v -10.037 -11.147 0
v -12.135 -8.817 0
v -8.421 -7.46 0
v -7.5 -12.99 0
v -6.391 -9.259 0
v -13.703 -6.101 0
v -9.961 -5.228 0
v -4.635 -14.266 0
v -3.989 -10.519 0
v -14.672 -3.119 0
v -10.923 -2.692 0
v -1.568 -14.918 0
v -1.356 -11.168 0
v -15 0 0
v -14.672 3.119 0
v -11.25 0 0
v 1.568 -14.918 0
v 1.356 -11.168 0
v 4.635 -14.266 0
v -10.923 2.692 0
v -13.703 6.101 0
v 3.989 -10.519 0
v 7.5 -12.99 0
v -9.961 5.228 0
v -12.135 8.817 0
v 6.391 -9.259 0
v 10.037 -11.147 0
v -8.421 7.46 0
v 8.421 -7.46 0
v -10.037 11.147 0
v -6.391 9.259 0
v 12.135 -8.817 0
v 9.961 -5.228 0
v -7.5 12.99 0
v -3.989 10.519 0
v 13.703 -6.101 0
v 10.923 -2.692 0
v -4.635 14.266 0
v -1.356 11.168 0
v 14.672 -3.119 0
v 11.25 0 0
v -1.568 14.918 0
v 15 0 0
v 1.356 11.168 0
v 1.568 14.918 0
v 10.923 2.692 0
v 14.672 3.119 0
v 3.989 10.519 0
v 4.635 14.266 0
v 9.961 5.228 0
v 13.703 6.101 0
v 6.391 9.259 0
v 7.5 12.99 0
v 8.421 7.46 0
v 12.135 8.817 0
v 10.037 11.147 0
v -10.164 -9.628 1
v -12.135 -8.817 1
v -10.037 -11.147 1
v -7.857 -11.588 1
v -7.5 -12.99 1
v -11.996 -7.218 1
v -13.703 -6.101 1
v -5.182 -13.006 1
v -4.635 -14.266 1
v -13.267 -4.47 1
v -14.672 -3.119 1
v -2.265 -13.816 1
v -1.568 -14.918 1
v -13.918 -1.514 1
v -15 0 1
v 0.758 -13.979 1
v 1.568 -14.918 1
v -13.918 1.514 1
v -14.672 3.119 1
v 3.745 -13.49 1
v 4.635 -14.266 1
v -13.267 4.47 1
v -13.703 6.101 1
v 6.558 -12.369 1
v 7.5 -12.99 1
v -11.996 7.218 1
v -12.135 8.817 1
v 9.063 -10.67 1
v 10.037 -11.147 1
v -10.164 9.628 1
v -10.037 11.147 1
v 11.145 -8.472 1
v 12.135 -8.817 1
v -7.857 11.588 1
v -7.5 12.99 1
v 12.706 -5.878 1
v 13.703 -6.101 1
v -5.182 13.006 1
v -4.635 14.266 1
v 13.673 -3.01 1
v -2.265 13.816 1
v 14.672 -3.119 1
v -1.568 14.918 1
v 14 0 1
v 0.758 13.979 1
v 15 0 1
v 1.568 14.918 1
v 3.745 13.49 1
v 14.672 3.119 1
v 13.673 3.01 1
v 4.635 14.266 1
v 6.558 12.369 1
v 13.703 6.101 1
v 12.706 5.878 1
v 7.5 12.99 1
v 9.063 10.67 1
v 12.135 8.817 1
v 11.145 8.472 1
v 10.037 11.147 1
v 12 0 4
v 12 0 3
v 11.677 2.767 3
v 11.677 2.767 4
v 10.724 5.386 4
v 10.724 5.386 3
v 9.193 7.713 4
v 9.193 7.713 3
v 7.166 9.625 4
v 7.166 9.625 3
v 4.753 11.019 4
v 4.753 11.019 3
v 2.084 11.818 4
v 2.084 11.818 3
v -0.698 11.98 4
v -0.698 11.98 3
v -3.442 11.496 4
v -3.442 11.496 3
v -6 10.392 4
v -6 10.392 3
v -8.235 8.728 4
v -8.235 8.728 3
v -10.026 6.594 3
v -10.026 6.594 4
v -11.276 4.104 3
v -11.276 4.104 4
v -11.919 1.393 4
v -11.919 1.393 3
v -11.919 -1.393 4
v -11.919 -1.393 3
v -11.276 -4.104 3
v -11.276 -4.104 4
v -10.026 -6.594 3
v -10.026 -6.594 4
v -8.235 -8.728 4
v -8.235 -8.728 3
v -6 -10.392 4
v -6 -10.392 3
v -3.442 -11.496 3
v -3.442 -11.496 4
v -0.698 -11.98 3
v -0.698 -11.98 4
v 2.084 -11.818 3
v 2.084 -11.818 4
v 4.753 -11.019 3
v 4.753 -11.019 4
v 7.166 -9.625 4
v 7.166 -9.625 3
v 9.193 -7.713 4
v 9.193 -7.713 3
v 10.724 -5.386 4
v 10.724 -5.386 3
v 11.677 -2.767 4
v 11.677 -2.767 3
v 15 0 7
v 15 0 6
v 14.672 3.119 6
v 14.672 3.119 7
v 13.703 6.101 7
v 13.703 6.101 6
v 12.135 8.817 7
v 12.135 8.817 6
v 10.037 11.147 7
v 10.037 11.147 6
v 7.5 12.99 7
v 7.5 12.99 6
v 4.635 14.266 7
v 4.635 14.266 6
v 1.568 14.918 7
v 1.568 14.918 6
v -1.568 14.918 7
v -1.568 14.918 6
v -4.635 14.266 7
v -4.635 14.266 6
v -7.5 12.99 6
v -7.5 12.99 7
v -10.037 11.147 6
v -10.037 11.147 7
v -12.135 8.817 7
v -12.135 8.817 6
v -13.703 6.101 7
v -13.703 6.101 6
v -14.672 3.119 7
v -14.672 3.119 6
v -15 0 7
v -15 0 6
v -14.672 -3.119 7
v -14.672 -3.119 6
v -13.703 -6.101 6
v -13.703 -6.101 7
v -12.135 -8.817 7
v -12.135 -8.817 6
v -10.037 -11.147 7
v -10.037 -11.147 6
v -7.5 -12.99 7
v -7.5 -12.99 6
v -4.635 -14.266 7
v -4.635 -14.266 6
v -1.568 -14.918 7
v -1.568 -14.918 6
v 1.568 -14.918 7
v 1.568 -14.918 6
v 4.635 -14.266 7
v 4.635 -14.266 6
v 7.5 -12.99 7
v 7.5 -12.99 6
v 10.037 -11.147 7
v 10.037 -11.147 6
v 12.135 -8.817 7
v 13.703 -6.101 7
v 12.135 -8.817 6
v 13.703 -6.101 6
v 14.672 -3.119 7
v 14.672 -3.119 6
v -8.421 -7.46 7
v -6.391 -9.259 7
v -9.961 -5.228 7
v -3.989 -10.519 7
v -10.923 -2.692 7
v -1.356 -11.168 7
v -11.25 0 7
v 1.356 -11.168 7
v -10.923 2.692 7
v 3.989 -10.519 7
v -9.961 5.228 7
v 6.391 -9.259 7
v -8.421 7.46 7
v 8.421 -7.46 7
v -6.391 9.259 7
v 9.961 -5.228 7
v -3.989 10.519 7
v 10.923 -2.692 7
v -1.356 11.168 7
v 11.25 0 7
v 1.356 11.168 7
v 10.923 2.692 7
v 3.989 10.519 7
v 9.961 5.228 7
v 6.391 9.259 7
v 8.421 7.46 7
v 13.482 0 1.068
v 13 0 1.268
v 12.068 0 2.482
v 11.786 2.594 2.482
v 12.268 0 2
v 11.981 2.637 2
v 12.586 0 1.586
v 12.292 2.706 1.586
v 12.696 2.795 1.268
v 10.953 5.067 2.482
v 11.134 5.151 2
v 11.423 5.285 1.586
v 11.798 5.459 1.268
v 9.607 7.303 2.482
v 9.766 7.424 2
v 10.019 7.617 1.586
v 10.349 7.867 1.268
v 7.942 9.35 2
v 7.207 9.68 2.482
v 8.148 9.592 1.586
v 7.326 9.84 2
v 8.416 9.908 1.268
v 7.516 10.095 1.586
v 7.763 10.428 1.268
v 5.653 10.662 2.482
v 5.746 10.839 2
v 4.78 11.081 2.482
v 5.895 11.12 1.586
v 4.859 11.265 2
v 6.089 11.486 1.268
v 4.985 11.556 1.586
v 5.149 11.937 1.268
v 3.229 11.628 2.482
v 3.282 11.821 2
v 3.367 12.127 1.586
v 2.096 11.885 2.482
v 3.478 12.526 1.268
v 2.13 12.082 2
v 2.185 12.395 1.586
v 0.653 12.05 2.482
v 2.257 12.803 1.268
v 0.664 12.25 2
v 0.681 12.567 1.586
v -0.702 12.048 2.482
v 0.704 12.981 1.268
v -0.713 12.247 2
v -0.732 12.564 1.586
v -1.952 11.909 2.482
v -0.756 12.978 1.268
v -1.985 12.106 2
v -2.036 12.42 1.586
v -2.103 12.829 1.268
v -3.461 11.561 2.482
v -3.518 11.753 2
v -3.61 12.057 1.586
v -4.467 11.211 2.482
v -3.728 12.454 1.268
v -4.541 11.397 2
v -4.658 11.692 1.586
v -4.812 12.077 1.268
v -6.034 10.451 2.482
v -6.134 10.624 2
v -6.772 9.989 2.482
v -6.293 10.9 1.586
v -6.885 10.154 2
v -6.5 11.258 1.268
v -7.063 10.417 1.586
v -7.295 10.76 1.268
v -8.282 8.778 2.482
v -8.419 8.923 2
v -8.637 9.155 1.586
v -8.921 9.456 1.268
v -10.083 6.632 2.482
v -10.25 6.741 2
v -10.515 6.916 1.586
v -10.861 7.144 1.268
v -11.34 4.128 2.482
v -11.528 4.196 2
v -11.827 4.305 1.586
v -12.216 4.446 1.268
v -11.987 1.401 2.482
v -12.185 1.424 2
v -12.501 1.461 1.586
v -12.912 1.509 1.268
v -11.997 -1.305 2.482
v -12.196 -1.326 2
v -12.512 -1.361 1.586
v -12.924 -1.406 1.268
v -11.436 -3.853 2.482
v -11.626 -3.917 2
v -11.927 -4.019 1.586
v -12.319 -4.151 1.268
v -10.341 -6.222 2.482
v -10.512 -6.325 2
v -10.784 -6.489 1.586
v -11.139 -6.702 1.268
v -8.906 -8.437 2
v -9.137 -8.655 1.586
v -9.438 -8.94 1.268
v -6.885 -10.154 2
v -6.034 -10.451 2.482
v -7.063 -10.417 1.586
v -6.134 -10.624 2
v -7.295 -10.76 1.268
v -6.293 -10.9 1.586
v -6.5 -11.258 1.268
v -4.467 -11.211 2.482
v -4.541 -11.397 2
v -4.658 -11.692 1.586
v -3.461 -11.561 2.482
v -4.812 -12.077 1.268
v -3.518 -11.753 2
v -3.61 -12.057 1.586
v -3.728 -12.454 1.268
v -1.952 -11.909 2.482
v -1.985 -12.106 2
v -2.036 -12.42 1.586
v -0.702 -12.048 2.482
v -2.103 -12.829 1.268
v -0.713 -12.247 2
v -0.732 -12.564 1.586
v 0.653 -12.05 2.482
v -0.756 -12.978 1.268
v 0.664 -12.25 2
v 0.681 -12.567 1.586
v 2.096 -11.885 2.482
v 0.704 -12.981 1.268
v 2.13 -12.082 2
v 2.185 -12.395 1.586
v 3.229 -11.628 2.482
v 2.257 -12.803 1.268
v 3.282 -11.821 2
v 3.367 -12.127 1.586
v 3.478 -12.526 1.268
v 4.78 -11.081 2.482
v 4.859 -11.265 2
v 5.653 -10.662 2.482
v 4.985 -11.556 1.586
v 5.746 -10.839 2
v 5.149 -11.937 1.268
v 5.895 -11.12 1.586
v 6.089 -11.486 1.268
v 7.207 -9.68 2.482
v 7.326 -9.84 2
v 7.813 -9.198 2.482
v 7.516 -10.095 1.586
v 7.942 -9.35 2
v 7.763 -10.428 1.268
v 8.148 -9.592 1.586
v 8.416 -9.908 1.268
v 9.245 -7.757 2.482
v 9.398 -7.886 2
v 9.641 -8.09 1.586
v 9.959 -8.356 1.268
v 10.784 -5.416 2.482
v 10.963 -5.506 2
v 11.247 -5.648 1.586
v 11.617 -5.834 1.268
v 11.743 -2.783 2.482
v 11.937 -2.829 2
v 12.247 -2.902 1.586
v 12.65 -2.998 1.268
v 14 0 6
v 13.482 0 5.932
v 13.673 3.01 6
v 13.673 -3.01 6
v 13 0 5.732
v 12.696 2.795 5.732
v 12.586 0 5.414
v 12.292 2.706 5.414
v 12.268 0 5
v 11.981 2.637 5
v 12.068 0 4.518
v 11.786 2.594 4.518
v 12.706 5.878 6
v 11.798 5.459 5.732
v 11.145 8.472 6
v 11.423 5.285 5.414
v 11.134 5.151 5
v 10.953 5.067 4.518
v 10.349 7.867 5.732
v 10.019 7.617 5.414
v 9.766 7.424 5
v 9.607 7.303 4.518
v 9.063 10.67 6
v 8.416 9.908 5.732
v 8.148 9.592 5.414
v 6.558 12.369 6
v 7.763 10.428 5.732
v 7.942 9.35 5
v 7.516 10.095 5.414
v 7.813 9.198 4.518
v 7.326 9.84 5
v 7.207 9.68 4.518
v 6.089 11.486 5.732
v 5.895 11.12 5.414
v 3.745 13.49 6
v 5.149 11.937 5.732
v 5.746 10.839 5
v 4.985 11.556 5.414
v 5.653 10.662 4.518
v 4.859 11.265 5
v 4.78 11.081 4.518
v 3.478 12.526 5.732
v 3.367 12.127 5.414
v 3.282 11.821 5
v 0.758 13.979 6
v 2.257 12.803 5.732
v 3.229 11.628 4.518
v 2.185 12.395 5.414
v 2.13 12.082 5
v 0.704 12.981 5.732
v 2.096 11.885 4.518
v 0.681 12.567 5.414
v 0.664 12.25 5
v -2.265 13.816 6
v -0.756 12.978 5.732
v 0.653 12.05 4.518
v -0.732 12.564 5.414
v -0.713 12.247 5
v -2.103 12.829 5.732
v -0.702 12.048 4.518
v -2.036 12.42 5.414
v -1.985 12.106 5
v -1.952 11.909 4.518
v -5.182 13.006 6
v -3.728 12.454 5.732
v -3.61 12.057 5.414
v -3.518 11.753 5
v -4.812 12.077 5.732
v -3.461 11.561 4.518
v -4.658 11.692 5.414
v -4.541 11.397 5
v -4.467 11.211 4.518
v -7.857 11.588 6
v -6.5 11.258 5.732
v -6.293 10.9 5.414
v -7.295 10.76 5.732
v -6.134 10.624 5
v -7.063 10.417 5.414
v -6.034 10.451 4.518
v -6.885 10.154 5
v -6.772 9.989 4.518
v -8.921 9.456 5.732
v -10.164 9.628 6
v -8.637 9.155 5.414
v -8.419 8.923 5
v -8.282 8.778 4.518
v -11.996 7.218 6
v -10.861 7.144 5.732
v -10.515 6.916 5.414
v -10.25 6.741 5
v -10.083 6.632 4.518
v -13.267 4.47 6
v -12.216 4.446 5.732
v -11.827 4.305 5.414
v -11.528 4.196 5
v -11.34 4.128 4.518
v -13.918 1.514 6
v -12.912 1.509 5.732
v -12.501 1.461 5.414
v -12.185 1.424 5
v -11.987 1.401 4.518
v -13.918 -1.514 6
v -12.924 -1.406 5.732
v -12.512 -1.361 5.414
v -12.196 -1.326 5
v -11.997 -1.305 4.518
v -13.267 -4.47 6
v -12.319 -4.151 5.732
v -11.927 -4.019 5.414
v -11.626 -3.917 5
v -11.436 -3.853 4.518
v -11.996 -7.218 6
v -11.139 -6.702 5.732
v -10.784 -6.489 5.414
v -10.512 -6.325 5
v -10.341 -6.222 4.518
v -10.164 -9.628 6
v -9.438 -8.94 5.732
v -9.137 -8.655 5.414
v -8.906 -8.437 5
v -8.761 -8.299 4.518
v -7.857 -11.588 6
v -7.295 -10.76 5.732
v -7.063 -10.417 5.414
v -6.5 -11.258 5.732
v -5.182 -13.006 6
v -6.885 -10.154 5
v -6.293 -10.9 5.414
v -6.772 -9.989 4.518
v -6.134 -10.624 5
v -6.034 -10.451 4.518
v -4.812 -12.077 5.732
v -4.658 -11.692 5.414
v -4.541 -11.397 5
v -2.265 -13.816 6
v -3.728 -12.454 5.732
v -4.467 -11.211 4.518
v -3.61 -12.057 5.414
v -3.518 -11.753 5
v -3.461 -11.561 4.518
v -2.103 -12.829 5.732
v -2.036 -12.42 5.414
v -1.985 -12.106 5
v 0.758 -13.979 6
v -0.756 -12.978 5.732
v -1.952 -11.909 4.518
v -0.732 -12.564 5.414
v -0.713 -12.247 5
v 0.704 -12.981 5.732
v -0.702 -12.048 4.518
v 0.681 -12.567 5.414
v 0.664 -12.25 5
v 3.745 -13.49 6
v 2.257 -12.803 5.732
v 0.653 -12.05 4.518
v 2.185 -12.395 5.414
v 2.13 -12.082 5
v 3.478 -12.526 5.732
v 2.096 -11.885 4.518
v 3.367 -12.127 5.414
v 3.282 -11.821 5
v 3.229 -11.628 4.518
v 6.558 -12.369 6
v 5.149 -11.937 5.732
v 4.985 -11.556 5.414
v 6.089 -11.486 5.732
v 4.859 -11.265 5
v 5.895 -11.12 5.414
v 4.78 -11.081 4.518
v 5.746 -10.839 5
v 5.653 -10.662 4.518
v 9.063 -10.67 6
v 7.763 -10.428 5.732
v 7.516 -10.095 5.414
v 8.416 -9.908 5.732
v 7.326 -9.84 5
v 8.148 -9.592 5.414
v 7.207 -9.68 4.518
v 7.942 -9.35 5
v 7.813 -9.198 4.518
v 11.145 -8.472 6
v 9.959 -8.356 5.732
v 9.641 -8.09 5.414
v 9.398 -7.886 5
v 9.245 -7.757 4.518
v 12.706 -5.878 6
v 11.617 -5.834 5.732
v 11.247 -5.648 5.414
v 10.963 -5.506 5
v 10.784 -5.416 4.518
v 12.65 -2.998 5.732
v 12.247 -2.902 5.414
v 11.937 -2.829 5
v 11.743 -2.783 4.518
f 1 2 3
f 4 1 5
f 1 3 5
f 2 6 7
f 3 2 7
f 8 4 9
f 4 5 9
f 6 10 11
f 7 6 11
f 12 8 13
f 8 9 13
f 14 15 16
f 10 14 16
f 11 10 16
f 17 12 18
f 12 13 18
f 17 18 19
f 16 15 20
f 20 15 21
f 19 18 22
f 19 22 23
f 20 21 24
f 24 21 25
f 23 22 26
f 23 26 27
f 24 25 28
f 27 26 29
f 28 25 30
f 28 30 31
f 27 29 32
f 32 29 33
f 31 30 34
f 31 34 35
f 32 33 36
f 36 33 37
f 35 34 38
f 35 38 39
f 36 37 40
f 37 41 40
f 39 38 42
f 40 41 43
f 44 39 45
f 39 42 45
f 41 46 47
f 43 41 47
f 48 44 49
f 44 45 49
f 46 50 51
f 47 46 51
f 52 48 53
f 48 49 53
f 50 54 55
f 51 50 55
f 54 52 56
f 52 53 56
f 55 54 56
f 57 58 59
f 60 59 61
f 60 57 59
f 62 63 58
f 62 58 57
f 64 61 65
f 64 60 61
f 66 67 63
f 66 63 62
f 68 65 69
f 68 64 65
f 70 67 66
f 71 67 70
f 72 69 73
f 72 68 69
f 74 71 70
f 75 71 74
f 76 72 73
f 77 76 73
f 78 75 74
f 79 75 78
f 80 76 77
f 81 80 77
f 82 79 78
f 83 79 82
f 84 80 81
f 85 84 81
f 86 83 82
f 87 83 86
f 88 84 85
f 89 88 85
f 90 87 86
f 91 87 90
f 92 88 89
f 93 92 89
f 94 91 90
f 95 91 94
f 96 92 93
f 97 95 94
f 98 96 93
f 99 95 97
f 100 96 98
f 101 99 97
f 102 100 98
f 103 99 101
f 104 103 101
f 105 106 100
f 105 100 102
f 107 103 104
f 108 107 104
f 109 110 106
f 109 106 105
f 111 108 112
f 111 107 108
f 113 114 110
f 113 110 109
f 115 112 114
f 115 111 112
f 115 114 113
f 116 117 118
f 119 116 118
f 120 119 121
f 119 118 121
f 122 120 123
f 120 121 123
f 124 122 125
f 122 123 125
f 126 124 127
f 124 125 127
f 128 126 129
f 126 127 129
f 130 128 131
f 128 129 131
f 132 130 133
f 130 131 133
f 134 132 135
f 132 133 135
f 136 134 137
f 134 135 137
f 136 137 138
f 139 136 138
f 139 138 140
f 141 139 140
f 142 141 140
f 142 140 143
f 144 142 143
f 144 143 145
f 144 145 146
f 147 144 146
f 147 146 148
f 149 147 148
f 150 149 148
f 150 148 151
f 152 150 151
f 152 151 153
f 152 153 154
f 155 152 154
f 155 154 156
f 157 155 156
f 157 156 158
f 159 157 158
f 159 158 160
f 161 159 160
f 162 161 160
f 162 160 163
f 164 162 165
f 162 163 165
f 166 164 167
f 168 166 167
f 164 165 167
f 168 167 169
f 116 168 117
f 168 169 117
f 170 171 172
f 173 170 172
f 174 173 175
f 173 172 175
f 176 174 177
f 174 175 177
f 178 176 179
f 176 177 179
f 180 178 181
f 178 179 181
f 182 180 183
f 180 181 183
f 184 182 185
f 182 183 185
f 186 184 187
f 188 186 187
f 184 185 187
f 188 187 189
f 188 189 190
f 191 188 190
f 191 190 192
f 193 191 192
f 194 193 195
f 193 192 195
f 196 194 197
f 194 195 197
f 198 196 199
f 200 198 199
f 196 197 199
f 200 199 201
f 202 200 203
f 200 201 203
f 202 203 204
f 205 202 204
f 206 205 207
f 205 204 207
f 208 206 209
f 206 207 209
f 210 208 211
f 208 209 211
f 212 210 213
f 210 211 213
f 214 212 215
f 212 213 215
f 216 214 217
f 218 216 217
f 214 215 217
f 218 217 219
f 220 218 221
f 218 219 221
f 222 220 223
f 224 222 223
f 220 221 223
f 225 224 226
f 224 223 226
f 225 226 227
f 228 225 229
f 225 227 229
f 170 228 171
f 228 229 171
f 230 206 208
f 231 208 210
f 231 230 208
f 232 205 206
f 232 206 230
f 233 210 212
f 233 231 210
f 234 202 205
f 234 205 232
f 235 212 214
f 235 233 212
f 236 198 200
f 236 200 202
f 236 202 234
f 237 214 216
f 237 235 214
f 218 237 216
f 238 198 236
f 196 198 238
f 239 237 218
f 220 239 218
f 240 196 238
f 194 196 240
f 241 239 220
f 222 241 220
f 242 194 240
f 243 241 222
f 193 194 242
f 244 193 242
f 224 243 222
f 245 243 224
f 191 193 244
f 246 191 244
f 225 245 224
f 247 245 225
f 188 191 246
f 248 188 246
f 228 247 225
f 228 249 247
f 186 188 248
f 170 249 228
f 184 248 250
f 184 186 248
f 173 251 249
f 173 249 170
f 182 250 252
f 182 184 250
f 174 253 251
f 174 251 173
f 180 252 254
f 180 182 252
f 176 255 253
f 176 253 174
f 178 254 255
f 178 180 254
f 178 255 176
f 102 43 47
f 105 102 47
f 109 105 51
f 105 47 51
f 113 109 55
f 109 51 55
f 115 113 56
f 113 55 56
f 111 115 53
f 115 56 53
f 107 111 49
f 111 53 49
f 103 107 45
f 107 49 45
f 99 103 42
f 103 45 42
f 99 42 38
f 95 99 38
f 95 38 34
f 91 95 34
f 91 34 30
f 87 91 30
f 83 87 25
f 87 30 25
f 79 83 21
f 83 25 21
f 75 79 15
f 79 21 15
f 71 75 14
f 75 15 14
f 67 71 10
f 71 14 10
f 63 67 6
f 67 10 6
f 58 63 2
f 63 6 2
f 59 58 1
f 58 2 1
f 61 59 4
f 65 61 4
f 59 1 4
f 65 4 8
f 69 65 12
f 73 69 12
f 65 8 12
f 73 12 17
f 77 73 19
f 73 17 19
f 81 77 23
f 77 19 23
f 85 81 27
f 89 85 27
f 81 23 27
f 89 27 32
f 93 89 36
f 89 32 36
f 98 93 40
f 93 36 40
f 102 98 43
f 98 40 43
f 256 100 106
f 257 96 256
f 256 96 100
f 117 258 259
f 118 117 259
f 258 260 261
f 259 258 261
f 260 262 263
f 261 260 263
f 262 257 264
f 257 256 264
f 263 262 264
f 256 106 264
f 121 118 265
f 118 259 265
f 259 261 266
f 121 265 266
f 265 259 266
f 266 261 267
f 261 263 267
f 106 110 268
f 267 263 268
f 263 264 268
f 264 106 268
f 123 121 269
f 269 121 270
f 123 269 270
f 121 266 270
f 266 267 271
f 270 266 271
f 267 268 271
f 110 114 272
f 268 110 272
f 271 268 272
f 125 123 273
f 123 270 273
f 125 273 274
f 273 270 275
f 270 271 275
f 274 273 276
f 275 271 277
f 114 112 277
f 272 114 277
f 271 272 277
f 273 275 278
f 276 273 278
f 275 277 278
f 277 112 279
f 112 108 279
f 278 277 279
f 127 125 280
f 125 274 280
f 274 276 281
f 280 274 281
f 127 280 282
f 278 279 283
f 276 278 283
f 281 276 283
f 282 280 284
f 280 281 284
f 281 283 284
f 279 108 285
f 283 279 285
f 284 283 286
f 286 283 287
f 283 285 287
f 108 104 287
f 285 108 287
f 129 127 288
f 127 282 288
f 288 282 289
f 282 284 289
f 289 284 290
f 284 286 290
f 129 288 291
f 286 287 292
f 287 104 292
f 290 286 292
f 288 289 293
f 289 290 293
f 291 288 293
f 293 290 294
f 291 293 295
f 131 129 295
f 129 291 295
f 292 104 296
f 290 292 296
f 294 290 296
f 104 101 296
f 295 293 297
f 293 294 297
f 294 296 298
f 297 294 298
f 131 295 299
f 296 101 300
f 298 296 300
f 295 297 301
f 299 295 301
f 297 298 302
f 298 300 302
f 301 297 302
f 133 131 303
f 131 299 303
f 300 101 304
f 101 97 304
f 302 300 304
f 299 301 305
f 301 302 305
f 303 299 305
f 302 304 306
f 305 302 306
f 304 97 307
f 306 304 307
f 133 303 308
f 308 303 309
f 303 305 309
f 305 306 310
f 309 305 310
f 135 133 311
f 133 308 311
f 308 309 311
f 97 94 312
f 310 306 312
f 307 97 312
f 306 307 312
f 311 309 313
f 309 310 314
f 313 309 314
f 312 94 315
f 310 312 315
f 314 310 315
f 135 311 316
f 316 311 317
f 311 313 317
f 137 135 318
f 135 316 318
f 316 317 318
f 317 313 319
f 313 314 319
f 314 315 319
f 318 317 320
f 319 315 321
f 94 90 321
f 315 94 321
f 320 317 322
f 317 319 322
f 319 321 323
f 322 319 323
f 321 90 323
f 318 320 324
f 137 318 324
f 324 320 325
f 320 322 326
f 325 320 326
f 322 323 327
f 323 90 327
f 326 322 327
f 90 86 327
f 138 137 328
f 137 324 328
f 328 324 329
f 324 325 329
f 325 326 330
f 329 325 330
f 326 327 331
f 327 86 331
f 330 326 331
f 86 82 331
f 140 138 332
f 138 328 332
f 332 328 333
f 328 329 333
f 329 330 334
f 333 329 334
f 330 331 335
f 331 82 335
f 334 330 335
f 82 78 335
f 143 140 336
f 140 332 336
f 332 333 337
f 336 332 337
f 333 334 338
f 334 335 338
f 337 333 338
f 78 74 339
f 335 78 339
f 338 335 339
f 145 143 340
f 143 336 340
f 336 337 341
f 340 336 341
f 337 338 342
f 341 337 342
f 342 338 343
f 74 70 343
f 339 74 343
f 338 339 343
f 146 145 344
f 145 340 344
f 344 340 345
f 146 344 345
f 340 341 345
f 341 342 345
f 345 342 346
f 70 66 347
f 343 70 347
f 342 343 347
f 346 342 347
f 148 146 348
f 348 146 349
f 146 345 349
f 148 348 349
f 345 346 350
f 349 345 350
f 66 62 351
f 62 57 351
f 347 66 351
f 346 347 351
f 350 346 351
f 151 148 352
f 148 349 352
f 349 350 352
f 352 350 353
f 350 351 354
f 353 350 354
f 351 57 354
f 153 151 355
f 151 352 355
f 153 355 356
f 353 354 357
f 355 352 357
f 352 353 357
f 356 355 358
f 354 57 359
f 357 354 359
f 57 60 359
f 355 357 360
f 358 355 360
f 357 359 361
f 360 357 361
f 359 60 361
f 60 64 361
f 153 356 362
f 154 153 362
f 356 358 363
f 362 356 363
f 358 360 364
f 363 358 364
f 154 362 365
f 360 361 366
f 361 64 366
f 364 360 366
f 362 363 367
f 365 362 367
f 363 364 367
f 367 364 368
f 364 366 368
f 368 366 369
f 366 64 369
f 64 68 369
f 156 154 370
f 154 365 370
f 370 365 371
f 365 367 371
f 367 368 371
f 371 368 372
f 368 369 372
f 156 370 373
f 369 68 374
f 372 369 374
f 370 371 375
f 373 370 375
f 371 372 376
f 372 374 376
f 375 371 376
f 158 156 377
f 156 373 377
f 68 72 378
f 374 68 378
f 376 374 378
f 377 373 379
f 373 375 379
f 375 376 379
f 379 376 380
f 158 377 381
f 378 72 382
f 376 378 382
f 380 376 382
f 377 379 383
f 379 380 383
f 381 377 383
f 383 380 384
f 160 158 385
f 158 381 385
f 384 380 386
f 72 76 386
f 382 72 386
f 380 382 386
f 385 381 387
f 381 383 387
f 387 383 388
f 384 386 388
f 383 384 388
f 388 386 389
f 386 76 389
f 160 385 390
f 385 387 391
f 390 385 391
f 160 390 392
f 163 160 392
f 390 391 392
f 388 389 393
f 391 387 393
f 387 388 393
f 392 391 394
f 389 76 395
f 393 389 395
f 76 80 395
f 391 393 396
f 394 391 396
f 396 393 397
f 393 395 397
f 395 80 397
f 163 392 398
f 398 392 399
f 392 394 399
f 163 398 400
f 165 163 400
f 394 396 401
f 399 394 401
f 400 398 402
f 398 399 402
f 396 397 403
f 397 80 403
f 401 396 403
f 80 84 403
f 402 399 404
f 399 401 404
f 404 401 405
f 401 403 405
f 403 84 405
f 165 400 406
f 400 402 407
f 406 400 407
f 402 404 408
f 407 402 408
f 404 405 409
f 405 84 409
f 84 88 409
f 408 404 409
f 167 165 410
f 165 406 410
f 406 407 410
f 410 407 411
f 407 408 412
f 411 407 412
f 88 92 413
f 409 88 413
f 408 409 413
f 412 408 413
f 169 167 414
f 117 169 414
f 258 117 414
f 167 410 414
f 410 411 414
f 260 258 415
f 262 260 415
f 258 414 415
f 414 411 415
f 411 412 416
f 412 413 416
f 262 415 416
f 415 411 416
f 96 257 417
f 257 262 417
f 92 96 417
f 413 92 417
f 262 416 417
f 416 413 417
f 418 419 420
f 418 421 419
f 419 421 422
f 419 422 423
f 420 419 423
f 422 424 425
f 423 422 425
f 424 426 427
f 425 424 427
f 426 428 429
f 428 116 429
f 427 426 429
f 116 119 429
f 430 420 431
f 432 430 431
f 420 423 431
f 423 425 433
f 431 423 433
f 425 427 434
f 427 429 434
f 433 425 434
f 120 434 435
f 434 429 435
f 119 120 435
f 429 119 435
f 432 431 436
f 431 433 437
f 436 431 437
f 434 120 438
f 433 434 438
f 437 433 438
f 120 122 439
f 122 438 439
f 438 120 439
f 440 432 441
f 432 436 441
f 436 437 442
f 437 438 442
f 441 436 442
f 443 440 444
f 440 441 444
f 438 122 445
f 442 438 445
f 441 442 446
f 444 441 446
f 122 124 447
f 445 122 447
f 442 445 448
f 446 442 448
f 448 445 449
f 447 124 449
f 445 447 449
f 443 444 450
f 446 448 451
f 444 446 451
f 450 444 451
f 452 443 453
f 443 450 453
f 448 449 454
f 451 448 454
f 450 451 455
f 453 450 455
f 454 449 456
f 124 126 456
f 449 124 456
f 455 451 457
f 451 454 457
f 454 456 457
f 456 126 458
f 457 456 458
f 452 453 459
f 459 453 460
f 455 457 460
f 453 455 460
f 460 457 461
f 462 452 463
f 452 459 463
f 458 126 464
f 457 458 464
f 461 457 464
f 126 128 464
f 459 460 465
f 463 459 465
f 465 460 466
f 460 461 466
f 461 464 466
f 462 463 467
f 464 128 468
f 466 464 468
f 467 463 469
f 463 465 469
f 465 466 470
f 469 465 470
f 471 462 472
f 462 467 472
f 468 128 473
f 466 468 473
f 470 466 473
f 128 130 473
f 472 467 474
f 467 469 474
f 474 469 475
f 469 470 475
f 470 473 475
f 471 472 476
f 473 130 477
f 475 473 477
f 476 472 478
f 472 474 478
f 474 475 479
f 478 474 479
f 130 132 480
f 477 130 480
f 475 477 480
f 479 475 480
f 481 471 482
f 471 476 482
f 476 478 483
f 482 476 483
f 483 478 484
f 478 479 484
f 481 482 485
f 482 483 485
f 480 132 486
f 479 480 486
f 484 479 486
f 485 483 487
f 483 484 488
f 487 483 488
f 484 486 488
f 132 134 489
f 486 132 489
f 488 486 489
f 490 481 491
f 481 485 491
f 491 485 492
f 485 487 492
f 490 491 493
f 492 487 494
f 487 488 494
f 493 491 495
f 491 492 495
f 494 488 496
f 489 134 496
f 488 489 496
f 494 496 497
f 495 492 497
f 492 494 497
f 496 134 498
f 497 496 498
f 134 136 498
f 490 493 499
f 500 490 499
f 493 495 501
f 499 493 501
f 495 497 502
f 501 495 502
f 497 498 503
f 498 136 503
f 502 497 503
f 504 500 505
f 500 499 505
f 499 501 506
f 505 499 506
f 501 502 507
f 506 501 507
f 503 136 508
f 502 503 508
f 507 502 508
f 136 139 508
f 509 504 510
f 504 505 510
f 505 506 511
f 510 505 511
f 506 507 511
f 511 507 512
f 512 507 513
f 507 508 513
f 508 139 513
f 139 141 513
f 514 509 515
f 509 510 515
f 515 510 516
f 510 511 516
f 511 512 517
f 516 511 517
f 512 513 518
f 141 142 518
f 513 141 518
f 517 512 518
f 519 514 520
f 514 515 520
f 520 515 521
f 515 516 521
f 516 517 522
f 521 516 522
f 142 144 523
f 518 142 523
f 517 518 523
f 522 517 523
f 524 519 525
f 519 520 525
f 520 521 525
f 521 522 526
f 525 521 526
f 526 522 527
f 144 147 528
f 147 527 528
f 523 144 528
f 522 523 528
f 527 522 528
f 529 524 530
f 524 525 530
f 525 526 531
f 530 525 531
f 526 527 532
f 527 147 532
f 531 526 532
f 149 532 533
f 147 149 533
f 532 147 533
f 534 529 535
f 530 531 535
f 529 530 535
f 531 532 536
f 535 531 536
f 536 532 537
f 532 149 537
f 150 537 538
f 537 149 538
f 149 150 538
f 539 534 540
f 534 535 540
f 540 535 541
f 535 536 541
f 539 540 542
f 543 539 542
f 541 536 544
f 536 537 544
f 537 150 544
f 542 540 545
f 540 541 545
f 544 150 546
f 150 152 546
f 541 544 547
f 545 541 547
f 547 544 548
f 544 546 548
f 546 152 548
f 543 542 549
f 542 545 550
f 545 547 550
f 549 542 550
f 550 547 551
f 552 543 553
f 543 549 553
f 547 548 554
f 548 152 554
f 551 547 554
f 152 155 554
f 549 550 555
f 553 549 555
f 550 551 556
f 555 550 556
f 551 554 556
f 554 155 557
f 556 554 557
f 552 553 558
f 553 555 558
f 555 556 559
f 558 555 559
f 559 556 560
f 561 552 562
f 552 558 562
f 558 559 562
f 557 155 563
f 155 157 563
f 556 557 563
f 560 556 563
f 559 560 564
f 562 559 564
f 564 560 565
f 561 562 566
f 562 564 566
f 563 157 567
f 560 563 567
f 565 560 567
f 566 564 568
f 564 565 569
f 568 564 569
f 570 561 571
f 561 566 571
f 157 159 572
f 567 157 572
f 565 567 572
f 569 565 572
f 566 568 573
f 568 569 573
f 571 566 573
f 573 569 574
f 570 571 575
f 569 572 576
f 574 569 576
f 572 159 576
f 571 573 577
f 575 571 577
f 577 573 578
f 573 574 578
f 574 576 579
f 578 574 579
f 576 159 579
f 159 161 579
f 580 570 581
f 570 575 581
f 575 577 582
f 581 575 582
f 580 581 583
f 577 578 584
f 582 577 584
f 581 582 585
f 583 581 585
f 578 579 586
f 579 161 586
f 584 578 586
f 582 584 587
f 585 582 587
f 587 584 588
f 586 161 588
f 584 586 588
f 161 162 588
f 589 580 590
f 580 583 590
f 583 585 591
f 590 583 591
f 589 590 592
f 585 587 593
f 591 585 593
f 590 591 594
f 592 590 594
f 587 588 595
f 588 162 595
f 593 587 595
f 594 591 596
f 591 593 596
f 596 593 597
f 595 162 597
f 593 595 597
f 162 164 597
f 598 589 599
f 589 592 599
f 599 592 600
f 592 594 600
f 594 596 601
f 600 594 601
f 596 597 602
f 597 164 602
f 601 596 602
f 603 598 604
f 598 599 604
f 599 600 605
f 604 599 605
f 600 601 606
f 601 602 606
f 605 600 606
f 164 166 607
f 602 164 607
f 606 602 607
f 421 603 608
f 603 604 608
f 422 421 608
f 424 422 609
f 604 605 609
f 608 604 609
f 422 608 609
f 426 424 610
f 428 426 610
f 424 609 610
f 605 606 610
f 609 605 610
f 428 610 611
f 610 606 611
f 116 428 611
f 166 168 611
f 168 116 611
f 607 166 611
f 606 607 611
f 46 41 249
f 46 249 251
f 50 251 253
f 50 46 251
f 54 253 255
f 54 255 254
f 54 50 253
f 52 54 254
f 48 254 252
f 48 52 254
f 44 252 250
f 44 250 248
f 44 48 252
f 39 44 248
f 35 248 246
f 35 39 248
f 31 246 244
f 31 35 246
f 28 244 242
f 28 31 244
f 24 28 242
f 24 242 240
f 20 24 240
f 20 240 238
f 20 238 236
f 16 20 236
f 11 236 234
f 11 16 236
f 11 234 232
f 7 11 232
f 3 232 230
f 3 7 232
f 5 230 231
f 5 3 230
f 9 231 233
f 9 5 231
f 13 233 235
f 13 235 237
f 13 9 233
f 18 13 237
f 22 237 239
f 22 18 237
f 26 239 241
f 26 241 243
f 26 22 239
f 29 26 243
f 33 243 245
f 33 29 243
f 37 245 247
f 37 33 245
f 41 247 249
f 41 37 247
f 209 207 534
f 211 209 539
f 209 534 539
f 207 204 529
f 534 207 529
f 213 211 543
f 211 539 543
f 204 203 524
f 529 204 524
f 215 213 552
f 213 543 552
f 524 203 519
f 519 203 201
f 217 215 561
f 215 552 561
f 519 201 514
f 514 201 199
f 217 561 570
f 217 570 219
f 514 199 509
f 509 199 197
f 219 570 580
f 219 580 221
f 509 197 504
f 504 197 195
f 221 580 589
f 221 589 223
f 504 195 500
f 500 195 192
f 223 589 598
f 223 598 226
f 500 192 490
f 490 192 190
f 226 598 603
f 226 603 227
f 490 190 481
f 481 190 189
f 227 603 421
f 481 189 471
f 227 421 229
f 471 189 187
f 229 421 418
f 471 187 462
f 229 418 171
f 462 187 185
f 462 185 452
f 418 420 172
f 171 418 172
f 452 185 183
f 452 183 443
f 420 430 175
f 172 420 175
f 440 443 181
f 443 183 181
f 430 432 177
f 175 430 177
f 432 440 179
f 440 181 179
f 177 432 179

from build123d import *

# Parameters (mm, degrees)
F0_R        = 15
F0_R_2      = 12
F1_DEPTH    = 1
F0_R_3      = 11.25
F2_DEPTH    = 7
F3_START    = 5
F1_FACE_R   = 15
F1_FACE_R_2 = 12
F3_DEPTH    = 1
F4_R        = 2


with BuildPart() as f1:
    # F0 (on Top) → F1 (new body)
    with BuildSketch(Plane.XY):
        Circle(F0_R)
        Circle(F0_R_2, mode=Mode.SUBTRACT)
    extrude(amount=F1_DEPTH)

    # F0 (on Top) → F2 (join)
    with BuildSketch(Plane.XY):
        Circle(F0_R_2)
        Circle(F0_R_3, mode=Mode.SUBTRACT)
    extrude(amount=F2_DEPTH)

    # F1_face (on face) → F3 (join)
    with BuildSketch(Plane.XY.offset(1).offset(F3_START)):
        Circle(F1_FACE_R)
        Circle(F1_FACE_R_2, mode=Mode.SUBTRACT)
    extrude(amount=F3_DEPTH)

    # F4
    f4_edges = [f1.edges().sort_by_distance(p)[0] for p in [
        (12, 0, 3.5),
        (-12, 0, 6),
        (-12, 0, 1),
    ]]
    fillet(f4_edges, radius=F4_R)


solid = f1.part
